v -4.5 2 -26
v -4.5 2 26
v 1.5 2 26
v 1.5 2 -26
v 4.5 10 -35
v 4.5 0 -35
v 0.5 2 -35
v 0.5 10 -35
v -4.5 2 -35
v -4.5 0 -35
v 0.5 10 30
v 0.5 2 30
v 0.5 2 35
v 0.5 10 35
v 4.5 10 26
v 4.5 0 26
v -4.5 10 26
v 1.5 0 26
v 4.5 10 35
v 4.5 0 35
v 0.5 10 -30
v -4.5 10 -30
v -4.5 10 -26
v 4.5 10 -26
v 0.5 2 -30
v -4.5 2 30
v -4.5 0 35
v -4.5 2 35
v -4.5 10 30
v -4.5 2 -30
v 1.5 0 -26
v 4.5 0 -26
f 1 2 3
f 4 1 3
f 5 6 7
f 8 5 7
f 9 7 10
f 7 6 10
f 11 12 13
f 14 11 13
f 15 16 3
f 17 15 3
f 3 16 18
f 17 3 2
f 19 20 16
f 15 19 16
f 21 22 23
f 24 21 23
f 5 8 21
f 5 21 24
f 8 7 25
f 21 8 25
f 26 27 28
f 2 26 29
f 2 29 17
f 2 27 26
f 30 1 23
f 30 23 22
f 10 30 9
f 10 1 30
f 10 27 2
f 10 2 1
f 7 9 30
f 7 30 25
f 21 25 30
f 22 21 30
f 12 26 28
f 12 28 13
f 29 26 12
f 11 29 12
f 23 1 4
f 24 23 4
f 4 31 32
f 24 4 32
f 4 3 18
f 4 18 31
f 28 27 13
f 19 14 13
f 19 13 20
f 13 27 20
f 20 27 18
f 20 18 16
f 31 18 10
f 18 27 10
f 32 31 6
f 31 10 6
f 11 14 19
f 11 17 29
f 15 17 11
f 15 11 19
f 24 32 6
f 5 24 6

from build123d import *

# Parameters (mm, degrees)
RESSALTO_EXTRUS_O1_DEPTH   = 10
RESSALTO_EXTRUS_O1_2_DEPTH = 10
ESBO_O2_W                  = 9
ESBO_O2_H                  = 70
RESSALTO_EXTRUS_O2_DEPTH   = 2
ESBO_O3_W                  = 3
ESBO_O3_H                  = 52
CORTE_EXTRUS_O1_DEPTH      = 3


with BuildPart() as part:
    # Esboço1 → Ressalto-extrusão1 (new body)
    with BuildSketch(Plane(origin=(0, 0, 0), x_dir=(1, 0, 0), z_dir=(0, 1, 0))):
        Polygon((0.5, -30), (0.5, -35), (4.5, -35), (4.5, -26), (-4.5, -26), (-4.5, -30), align=None)
    extrude(amount=RESSALTO_EXTRUS_O1_DEPTH)



with BuildPart() as body_2:
    # Esboço1 → Ressalto-extrus_o1 2 (new body)
    with BuildSketch(Plane(origin=(0, 0, 0), x_dir=(1, 0, 0), z_dir=(0, 1, 0))):
        Polygon((-4.5, 30), (-4.5, 26), (4.5, 26), (4.5, 35), (0.5, 35), (0.5, 30), align=None)
    extrude(amount=RESSALTO_EXTRUS_O1_2_DEPTH)


with BuildPart() as part_1:
    add(part.part)

    add(body_2.part)  # Ressalto-extrusão2 merges body 2
    # Esboço2 → Ressalto-extrusão2 (add)
    with BuildSketch(Plane(origin=(0, 0, 0), x_dir=(1, 0, 0), z_dir=(0, 1, 0))):
        Rectangle(ESBO_O2_W, ESBO_O2_H)
    extrude(amount=RESSALTO_EXTRUS_O2_DEPTH)

    # Esboço3 → Corte-extrusão1 (cut, through all)
    with BuildSketch(Plane(origin=(0, 2, 0), x_dir=(1, 0, 0), z_dir=(0, 1, 0))):
        with Locations((3, 0)):
            Rectangle(ESBO_O3_W, ESBO_O3_H)
    extrude(amount=-CORTE_EXTRUS_O1_DEPTH, mode=Mode.SUBTRACT)


solid = part_1.part
